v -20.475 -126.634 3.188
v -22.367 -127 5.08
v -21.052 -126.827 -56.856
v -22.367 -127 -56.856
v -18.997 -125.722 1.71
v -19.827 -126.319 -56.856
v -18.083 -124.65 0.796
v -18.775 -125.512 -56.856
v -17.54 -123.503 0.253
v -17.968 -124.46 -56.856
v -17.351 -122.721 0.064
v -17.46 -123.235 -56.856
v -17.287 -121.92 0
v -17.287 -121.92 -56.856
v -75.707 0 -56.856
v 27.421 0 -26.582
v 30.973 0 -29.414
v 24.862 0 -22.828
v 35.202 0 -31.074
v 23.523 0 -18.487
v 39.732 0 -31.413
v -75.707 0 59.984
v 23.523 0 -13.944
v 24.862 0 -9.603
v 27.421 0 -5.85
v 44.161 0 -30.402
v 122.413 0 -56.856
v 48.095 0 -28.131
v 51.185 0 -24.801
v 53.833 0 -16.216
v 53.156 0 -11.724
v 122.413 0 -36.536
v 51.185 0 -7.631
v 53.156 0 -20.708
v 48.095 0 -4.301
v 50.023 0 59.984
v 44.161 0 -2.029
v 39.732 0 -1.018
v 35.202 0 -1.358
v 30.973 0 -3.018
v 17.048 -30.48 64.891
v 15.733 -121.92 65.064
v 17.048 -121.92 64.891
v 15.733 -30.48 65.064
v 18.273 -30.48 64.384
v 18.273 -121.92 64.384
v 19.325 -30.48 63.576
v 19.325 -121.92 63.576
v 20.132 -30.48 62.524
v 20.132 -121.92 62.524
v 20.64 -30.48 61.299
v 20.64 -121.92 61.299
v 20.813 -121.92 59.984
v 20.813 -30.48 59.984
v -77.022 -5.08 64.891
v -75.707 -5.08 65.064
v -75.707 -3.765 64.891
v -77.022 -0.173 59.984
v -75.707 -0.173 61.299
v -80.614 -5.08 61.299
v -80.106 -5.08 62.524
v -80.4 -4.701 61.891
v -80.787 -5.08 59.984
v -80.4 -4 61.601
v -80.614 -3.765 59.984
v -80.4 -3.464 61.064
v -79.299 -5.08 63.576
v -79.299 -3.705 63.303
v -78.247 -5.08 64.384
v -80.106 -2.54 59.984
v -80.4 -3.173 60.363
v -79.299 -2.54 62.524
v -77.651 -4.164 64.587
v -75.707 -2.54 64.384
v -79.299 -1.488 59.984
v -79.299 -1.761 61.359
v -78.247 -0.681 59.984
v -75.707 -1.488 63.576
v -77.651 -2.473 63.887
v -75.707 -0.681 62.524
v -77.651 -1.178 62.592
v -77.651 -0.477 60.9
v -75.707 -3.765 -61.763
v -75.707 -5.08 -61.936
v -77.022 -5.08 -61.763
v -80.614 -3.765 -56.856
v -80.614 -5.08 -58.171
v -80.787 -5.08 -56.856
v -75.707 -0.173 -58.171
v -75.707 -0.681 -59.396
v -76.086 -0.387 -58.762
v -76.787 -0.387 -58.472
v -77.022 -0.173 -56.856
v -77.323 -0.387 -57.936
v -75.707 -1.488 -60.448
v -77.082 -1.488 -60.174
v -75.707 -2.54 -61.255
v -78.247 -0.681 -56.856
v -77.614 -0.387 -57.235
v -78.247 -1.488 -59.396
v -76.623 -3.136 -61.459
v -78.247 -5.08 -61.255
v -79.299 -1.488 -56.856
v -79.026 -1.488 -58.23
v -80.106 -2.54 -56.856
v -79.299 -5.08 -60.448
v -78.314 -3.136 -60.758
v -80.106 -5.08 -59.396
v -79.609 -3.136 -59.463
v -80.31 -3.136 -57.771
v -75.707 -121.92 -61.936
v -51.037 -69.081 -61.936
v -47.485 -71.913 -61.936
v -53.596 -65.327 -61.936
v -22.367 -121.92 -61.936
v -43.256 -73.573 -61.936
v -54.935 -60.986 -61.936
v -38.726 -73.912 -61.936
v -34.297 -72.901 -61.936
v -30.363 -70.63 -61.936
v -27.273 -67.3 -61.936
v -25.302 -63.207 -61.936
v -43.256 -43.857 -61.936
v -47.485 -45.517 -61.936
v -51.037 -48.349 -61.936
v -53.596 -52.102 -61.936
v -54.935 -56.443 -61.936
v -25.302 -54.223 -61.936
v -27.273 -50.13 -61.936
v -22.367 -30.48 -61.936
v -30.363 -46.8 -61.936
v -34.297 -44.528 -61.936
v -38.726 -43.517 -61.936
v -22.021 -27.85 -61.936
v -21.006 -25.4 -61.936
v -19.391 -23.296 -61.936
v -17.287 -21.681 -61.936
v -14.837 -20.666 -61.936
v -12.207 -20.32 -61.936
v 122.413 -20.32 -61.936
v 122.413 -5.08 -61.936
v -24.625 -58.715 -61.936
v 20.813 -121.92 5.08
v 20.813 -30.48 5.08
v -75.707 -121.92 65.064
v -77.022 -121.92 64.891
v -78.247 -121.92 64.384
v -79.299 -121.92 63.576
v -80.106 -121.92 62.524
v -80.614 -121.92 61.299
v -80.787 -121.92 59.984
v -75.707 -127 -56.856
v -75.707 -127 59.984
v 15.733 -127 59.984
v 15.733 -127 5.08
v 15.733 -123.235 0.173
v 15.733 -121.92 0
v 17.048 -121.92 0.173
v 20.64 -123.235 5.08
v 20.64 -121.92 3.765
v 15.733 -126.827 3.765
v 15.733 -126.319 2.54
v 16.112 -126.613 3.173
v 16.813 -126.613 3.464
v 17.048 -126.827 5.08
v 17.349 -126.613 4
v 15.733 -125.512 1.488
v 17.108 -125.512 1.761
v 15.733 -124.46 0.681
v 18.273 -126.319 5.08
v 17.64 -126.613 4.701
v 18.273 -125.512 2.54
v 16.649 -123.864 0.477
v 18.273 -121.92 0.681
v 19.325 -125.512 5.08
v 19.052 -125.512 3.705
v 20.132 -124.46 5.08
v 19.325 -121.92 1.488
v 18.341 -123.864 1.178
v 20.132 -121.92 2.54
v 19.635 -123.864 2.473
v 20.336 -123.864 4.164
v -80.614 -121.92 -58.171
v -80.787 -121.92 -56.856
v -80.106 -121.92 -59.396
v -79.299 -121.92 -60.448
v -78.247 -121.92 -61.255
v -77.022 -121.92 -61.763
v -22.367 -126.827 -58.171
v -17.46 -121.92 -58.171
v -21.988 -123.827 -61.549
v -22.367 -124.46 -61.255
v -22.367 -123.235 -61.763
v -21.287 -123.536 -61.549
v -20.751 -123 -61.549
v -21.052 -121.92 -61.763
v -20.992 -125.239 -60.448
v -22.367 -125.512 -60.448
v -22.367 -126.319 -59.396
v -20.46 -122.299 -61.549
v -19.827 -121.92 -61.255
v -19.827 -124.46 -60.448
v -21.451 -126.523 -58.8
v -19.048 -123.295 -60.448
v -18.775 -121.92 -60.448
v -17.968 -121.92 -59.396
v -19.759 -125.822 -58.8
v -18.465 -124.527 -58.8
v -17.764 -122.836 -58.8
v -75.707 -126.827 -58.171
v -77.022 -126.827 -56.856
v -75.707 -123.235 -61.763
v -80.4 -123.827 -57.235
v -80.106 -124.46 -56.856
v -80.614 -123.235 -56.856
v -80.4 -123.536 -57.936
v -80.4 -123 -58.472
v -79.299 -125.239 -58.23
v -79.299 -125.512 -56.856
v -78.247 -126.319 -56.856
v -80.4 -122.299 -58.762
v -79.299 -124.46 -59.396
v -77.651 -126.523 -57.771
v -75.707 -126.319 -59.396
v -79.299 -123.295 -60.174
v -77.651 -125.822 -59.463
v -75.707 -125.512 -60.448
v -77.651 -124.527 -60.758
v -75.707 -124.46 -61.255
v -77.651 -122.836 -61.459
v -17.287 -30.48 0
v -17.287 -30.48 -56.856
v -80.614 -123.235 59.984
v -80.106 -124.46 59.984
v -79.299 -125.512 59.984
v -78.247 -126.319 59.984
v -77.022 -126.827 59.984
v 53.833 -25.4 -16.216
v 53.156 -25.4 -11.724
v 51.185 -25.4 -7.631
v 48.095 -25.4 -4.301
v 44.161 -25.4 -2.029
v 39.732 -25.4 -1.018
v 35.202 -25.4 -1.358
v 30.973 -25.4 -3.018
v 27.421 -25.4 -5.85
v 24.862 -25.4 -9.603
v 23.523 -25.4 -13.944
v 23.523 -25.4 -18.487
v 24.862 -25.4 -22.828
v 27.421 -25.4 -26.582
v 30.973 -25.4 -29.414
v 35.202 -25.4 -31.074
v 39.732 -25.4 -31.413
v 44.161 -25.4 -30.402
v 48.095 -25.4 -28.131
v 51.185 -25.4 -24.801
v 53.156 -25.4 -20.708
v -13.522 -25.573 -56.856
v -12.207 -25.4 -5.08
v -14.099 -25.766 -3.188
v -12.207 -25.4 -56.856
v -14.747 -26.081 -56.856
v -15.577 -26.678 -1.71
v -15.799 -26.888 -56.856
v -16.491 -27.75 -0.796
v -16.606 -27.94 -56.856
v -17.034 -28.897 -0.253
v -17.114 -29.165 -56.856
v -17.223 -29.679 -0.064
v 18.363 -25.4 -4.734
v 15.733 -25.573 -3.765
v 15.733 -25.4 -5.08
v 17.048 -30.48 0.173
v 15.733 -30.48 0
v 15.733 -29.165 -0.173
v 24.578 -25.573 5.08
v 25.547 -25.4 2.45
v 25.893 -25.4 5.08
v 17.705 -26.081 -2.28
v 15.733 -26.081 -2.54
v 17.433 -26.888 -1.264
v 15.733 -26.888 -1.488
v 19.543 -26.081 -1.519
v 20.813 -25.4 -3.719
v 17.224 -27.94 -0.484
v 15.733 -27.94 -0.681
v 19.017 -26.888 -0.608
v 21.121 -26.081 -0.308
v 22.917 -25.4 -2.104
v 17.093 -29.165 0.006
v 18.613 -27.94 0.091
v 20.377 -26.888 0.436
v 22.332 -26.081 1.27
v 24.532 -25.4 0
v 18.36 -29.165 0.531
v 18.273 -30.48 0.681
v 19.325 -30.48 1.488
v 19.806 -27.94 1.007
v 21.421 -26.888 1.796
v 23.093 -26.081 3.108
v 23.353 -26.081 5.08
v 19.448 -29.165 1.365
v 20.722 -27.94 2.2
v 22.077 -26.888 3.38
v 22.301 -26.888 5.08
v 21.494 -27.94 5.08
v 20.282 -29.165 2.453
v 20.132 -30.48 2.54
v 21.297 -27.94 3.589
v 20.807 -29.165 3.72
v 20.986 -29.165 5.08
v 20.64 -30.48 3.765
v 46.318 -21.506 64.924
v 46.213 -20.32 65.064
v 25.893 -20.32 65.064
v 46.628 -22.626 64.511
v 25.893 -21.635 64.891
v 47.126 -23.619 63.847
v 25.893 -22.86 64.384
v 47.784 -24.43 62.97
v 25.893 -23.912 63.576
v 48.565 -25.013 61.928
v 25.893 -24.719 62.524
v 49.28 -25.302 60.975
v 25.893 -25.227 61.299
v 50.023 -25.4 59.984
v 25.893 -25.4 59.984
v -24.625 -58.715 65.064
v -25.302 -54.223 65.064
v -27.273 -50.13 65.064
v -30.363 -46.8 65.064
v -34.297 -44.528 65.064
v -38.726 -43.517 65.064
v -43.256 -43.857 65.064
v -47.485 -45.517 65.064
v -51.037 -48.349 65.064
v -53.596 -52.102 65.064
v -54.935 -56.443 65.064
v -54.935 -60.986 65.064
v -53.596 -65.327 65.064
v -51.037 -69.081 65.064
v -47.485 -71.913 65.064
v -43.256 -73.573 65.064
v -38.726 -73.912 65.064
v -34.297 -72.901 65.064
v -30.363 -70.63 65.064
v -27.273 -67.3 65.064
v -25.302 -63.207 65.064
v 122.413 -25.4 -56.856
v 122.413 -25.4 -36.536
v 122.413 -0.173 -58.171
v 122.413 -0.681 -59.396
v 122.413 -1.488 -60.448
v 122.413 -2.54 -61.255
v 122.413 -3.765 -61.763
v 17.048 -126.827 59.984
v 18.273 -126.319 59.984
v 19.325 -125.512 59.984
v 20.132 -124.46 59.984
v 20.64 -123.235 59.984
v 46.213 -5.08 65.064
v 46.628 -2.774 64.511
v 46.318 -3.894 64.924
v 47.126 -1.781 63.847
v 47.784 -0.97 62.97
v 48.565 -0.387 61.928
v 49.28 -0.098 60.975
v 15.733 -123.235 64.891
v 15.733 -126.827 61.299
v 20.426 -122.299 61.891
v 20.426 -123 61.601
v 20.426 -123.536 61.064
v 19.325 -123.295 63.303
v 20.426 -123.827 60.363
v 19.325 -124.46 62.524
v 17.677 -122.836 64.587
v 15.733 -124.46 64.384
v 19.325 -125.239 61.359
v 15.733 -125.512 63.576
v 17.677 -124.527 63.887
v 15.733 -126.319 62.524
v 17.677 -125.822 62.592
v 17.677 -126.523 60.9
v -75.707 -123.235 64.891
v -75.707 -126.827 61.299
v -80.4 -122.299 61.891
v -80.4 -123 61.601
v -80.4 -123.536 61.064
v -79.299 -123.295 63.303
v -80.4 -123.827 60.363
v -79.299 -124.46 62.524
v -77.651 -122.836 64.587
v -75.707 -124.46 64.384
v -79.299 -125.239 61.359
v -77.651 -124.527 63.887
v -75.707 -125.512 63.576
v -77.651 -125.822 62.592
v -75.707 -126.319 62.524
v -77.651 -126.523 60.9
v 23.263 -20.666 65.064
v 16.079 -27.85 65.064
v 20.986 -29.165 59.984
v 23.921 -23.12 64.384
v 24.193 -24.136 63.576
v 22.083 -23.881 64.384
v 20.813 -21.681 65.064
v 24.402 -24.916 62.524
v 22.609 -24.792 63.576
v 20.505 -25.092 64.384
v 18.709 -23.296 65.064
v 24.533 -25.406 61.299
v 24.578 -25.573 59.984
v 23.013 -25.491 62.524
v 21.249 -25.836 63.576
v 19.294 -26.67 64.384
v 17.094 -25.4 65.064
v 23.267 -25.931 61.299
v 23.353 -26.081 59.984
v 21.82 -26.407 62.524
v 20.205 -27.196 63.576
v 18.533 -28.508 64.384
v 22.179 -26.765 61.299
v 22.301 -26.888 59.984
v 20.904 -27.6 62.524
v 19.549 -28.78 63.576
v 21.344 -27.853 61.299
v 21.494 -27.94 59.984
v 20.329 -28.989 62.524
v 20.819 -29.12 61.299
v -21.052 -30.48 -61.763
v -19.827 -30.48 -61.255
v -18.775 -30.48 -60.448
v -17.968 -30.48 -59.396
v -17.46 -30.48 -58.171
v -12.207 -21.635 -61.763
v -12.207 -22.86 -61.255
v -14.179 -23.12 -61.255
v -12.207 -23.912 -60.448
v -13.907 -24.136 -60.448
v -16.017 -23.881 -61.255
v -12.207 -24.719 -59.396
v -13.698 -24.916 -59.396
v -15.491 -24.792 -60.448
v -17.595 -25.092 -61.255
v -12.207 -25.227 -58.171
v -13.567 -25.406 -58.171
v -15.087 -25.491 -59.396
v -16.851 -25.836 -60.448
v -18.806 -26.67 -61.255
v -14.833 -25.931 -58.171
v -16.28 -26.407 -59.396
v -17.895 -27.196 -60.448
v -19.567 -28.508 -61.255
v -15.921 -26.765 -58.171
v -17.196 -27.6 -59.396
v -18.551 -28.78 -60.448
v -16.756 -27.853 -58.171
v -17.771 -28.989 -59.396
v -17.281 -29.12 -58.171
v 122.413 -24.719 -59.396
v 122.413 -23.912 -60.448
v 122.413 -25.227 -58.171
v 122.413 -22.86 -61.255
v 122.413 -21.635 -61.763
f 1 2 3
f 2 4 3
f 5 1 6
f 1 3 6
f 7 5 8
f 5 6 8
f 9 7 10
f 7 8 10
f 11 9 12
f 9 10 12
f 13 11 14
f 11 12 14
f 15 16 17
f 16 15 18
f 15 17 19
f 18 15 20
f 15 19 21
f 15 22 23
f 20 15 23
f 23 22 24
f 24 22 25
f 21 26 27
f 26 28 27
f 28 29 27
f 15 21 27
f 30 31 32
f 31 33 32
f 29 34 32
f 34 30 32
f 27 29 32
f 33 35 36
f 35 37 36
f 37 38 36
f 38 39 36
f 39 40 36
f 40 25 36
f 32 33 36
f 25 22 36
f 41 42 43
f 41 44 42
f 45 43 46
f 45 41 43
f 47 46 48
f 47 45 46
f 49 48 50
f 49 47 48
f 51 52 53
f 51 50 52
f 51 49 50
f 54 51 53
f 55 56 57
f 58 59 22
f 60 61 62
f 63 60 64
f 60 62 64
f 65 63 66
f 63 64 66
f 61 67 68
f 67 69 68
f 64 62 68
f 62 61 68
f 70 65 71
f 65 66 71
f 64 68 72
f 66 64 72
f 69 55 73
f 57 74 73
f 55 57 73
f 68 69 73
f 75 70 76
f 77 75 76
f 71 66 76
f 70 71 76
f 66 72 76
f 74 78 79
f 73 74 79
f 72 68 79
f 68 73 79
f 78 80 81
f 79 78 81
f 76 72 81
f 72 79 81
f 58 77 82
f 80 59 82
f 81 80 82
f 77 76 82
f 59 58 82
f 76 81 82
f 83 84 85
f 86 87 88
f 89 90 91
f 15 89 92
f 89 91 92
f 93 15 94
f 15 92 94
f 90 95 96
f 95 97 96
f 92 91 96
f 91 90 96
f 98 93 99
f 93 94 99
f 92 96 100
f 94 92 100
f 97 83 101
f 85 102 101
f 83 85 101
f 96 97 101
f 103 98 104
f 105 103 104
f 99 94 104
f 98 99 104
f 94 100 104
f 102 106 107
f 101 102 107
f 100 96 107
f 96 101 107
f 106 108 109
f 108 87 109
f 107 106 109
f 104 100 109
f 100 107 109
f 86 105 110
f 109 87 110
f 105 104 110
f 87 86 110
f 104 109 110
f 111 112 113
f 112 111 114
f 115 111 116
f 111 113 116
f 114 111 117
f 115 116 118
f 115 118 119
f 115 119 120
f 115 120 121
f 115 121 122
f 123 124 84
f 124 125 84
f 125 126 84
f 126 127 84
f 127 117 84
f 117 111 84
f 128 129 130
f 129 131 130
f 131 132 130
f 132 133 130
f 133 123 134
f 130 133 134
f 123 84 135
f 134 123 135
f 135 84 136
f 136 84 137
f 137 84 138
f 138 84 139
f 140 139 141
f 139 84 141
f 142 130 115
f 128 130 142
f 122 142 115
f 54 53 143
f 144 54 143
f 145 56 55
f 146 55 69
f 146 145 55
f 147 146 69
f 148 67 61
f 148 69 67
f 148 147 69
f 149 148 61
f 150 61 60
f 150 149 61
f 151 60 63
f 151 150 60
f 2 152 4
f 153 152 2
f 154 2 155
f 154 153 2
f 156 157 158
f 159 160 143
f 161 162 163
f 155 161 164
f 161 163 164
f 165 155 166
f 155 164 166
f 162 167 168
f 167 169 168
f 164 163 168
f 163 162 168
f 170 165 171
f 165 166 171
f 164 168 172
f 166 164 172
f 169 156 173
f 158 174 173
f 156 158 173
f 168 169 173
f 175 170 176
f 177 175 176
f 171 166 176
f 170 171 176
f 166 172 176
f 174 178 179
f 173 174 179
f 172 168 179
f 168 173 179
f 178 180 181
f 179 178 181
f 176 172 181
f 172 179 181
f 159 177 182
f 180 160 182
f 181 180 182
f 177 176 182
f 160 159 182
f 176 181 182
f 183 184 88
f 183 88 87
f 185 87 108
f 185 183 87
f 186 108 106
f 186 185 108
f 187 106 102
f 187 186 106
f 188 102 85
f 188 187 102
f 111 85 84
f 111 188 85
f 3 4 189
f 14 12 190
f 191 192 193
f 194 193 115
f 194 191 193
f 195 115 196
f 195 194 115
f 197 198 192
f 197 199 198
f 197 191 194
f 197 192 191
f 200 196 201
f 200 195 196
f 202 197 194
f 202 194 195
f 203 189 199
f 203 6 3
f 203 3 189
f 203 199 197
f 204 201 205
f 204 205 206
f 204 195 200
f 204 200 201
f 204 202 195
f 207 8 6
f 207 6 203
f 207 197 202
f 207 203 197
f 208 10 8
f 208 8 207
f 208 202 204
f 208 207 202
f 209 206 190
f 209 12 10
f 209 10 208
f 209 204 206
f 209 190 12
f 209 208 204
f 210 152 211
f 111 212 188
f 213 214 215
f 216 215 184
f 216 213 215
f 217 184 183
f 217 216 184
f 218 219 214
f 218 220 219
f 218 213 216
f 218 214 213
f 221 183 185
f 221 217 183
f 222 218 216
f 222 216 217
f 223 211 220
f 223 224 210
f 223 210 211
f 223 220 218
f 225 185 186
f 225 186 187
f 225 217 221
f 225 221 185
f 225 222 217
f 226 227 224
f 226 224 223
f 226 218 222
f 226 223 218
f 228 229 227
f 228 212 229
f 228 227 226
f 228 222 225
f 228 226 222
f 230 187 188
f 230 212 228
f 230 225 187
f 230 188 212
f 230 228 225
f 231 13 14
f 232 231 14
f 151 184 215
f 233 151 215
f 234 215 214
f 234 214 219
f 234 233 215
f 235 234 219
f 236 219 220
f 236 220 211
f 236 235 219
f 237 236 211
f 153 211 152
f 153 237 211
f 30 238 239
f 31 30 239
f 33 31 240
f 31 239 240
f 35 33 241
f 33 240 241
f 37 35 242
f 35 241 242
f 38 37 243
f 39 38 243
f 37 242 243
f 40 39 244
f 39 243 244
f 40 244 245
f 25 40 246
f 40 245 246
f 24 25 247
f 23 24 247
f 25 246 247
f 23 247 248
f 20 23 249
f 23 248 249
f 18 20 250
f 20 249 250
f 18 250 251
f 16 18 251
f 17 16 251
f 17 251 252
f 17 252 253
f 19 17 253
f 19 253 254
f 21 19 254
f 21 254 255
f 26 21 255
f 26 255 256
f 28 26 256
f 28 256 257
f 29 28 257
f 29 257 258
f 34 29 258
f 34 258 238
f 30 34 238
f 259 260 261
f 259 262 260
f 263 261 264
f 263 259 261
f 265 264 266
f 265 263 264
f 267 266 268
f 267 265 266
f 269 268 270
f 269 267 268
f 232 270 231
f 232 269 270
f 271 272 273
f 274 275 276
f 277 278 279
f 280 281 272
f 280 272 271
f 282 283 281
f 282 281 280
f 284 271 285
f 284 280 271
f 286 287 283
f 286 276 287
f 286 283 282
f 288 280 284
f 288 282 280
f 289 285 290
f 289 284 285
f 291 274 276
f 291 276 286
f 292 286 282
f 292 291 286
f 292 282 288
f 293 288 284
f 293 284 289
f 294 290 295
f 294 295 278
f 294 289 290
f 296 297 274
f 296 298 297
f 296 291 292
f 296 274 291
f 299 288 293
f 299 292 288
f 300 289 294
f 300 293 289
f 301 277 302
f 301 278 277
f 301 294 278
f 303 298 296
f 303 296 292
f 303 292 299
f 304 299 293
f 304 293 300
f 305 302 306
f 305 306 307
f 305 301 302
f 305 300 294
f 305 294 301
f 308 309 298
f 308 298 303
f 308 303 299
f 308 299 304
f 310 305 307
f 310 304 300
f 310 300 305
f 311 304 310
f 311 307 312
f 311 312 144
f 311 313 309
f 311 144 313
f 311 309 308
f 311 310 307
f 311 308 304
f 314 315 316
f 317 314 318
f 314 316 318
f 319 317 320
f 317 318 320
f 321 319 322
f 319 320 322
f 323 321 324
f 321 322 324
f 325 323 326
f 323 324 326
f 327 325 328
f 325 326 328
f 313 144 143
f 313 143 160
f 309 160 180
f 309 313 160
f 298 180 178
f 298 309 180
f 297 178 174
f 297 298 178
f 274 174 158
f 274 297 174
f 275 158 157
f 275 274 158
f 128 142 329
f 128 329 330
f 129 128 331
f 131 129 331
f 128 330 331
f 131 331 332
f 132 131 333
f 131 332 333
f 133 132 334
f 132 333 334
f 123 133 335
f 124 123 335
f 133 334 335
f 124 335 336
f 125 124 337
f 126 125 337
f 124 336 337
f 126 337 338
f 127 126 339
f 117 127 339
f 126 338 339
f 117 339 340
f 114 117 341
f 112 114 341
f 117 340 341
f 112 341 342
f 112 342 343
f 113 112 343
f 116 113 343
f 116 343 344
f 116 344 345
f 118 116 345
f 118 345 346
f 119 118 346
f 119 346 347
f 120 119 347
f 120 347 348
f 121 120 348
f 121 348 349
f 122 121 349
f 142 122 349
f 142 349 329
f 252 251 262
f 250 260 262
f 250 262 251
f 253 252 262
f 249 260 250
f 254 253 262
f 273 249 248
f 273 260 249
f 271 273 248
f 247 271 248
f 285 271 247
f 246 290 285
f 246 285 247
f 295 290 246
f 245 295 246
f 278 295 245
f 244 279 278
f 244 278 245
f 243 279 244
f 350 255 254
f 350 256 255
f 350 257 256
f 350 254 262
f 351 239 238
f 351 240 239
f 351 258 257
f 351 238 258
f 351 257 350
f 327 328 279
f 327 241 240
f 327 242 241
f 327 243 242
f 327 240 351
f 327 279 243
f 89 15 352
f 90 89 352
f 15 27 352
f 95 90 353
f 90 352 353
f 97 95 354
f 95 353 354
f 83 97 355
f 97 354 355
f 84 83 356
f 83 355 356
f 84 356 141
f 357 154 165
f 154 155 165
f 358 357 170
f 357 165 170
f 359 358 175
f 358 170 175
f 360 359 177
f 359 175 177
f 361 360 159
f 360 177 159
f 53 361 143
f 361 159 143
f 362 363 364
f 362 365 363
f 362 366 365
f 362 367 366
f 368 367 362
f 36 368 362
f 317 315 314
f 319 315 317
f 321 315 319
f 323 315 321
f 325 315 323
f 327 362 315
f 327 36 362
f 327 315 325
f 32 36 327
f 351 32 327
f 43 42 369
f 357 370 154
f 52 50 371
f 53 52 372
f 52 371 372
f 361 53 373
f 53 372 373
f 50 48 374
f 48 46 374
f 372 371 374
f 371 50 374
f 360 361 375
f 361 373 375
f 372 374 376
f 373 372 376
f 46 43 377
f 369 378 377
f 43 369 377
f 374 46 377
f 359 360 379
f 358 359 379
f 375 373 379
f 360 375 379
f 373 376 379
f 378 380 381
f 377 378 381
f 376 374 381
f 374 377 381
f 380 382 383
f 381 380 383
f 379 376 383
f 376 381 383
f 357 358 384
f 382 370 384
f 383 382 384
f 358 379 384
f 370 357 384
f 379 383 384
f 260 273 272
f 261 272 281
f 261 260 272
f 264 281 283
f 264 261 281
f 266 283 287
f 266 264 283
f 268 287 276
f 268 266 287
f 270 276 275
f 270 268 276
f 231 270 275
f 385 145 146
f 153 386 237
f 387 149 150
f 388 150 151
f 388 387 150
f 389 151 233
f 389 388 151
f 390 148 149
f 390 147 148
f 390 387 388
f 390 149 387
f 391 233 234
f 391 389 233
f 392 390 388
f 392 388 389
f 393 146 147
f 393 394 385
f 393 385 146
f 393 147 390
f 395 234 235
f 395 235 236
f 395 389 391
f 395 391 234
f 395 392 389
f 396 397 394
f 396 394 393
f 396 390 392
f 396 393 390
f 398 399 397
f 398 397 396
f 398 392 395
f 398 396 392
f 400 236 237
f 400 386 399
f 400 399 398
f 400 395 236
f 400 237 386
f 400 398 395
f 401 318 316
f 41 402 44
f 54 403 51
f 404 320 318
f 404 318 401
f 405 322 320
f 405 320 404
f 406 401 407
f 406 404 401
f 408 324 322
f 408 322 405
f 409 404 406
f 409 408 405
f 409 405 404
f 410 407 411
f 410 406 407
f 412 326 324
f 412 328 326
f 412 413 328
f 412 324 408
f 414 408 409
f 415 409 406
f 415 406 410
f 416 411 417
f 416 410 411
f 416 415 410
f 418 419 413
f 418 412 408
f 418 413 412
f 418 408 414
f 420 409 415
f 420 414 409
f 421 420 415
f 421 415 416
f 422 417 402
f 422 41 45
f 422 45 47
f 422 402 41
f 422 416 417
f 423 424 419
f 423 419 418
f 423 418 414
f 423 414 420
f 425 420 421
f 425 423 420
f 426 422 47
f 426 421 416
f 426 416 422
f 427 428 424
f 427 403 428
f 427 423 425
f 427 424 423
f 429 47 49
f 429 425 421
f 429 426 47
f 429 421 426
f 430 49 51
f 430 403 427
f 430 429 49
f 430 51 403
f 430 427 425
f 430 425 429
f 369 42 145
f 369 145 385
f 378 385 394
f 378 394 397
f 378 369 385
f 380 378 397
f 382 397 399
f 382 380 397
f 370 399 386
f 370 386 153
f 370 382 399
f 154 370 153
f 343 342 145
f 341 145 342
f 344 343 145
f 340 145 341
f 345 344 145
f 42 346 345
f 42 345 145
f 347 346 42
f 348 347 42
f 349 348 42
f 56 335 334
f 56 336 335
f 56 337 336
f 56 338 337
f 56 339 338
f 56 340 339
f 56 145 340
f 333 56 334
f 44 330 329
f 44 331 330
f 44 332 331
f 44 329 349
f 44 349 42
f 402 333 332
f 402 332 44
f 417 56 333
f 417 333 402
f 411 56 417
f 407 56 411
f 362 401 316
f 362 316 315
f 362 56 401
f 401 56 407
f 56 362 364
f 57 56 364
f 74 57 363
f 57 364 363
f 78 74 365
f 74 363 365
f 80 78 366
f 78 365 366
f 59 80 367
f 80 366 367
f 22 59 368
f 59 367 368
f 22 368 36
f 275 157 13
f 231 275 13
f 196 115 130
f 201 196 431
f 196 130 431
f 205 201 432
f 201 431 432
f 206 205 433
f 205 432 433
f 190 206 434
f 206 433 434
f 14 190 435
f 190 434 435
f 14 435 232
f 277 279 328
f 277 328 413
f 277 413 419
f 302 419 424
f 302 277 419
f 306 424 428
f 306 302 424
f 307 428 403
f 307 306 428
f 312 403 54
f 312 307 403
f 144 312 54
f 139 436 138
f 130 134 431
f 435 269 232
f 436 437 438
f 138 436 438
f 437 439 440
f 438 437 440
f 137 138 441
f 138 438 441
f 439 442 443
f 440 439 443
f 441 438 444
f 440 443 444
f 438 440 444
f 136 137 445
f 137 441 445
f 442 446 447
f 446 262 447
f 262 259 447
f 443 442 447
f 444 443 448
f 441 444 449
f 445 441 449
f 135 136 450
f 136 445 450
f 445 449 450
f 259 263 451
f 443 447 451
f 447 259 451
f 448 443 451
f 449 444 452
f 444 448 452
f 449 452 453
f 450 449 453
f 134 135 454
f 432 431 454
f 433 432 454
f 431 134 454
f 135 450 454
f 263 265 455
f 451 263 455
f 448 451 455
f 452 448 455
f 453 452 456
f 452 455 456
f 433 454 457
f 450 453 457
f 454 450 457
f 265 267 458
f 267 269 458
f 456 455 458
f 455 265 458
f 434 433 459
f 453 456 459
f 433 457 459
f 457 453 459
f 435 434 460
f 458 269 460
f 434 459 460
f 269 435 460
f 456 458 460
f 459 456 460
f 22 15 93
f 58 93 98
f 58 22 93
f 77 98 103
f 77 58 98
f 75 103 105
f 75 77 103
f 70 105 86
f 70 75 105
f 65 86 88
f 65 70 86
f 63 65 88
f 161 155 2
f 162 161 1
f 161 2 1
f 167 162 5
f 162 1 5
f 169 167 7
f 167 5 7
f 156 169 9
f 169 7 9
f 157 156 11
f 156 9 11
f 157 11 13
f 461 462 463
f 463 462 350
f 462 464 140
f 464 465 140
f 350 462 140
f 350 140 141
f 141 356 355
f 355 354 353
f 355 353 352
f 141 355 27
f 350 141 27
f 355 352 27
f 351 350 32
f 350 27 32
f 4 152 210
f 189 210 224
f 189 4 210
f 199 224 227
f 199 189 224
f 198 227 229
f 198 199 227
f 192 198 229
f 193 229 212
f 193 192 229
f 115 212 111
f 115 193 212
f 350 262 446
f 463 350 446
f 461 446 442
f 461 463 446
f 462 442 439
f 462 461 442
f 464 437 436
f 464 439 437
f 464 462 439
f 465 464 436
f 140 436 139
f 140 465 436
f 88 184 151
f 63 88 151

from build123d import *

# Parameters (mm, degrees)
F0_W     = 203.2
F0_H     = 127
F1_DEPTH = 127
F3_DEPTH = 101.6
F4_SIZE2 = 101.6
F4_SIZE  = 76.2
F5_R     = 5.08
F6_R     = 15.24
F7_DEPTH = 1270
F8_R     = 15.24
F9_DEPTH = 12903.2


with BuildPart() as f1:
    # F0 (on Front) → F1 (new body)
    with BuildSketch(Plane.XZ):
        with Locations((20.8130544846, 1.564221409)):
            Rectangle(F0_W, F0_H)
    extrude(amount=F1_DEPTH)

    # F2 (on face) → F3 (cut)
    with BuildSketch(Plane.XZ.offset(127)):
        Polygon((122.4130544846, 65.064221409), (20.8130544846, 65.064221409), (20.8130544846, 0), (-17.2869455154, 0), (-17.2869455154, -61.935778591), (122.4130544846, -61.935778591), align=None)
    extrude(amount=-F3_DEPTH, mode=Mode.SUBTRACT)

    # F4
    f4_edges = [f1.edges().sort_by_distance(p)[0] for p in [
        (122.413054, -12.7, 65.064221),
    ]]
    f4_side = f1.faces().sort_by_distance((-13.053612, -55.033333, 65.064221))[0]
    chamfer(f4_edges, length=F4_SIZE, length2=F4_SIZE2, reference=f4_side)

    # F5
    f5_edges = [f1.edges().sort_by_distance(p)[0] for p in [
        (-29.986946, -127, 65.064221),
        (20.813054, -76.2, 65.064221),
        (20.813054, -25.4, 32.532111),
        (20.813054, -76.2, 0),
        (1.763054, -127, 0),
        (20.813054, -127, 32.532111),
        (-17.286946, -127, -30.967889),
        (-49.036946, -127, -61.935779),
        (-17.286946, -76.2, -61.935779),
        (-17.286946, -25.4, -30.967889),
        (-17.286946, 0, 65.064221),
        (-80.786946, -63.5, 65.064221),
        (-80.786946, -127, 1.564221),
        (-80.786946, -63.5, -61.935779),
        (20.813054, 0, -61.935779),
        (-80.786946, 0, 1.564221),
        (52.563054, -25.4, -61.935779),
        (33.513054, -25.4, 65.064221),
        (1.763054, -25.4, 0),
    ]]
    fillet(f5_edges, radius=F5_R)

    # F6 (on face) → F7 (cut)
    with BuildSketch(Plane.XZ.offset(25.4)):
        with Locations((38.5930544846, -16.215778591)):
            Circle(F6_R)
    extrude(amount=-F7_DEPTH, mode=Mode.SUBTRACT)

    # F8 (on face) → F9 (cut)
    with BuildSketch(Plane.XY.offset(65.064221409)):
        with Locations((-39.8652739823, -58.7147325277)):
            Circle(F8_R)
    extrude(amount=-F9_DEPTH, mode=Mode.SUBTRACT)


solid = f1.part
